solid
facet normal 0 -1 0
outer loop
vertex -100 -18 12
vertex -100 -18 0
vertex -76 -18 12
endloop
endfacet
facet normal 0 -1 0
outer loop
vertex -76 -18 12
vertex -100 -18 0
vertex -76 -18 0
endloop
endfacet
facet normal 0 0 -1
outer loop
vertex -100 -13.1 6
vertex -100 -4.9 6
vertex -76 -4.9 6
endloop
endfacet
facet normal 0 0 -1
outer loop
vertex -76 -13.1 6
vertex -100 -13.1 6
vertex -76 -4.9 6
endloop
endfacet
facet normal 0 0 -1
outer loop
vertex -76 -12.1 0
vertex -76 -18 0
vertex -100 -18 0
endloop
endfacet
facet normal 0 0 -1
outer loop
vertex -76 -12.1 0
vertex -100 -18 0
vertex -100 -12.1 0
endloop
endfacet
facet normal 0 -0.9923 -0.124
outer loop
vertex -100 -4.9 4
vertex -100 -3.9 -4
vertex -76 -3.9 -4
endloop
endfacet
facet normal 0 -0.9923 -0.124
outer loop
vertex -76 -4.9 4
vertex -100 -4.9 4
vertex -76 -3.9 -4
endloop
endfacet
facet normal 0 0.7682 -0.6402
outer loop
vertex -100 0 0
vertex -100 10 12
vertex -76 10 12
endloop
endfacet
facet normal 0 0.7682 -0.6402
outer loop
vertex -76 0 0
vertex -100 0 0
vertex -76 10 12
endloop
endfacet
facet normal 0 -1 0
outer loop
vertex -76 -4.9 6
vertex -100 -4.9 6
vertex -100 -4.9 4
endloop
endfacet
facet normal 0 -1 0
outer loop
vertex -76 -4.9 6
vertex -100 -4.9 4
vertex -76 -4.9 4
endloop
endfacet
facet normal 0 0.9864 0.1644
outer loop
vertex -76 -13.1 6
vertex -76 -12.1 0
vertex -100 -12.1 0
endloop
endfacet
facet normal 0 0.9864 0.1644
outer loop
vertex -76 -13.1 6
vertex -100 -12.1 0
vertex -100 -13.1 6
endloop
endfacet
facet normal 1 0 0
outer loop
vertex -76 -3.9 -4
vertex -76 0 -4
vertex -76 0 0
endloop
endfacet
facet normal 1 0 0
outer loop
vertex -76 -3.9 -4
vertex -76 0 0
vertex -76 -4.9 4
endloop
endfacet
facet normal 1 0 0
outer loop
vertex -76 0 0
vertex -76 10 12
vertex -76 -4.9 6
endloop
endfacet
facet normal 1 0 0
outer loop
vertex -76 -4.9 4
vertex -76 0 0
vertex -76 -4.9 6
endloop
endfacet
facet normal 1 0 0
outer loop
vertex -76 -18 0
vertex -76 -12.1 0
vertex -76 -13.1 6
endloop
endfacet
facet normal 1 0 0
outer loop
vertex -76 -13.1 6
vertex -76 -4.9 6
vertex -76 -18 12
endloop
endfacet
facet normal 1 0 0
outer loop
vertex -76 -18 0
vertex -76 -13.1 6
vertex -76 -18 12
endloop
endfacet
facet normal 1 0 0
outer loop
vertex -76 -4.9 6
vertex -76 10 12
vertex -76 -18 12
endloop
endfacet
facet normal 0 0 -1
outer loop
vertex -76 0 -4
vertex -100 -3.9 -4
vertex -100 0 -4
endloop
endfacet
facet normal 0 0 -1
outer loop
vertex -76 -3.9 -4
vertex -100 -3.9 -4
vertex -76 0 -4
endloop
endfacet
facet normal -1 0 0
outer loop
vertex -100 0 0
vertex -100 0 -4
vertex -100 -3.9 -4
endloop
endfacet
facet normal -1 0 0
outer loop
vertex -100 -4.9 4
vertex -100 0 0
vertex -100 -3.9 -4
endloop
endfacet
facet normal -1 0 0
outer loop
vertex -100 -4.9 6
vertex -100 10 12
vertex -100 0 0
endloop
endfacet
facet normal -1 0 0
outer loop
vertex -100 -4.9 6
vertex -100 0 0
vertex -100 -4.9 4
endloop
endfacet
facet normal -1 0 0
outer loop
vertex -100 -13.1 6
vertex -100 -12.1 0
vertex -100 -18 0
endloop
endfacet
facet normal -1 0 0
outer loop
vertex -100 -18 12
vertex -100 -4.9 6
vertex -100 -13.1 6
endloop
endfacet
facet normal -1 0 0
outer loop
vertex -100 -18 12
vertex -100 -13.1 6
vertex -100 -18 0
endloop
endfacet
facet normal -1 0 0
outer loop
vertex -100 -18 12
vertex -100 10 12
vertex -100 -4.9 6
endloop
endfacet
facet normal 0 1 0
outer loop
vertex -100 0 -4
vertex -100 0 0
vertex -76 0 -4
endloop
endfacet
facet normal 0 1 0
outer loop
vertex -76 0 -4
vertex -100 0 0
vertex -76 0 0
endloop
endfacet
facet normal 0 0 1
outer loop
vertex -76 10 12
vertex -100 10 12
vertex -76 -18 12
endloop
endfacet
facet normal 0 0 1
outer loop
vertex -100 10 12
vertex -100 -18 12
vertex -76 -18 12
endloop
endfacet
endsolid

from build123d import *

# Parameters (mm, degrees)
F0_W     = 24
F0_H     = 4.9
F0_H_2   = 4.1
F1_DEPTH = 12
F2_DEPTH = 6
F3_DEPTH = 10
F4_SIZE2 = 11.99999
F4_SIZE  = 9.99999
F6_DEPTH = 24
F7_DEPTH = 4
F8_SIZE2 = 1
F8_SIZE  = 8


# Not quite as in the source:
# - a fillet or chamfer is up to 0.001 mm smaller than in the source, because OpenCascade refuses the exact size


with BuildPart() as f1:
    # F0 (on Top) → F1 (new body)
    with BuildSketch(Plane.XY):
        with Locations((-88, -2.45)):
            Rectangle(F0_W, F0_H)
        with Locations((-88, -6.95)):
            Rectangle(F0_W, F0_H_2)
        with Locations((-88, -11.05)):
            Rectangle(F0_W, F0_H_2)
        with Locations((-88, -15.55)):
            Rectangle(F0_W, F0_H)
    extrude(amount=F1_DEPTH)

    # F0 (on Top) → F2 (cut)
    with BuildSketch(Plane.XY):
        with Locations((-88, -6.95)):
            Rectangle(F0_W, F0_H_2)
        with Locations((-88, -11.05)):
            Rectangle(F0_W, F0_H_2)
    extrude(amount=F2_DEPTH, mode=Mode.SUBTRACT)

    # F3 (add): a face of the model
    f3_faces = [f1.faces().sort_by_distance(p)[0] for p in [
        (-88, 0, 6),
    ]]
    extrude(f3_faces, amount=F3_DEPTH)

    # F4 (size 10 and 12 in the source; OpenCascade refuses exactly that, so slightly less here)
    f4_edges = [f1.edges().sort_by_distance(p)[0] for p in [
        (-88, 10, 0),
    ]]
    f4_side = f1.faces().sort_by_distance((-88, 2.55, 0))[0]
    chamfer(f4_edges, length=F4_SIZE, length2=F4_SIZE2, reference=f4_side)

    # F5 (on face) → F6 (join, through all)
    with BuildSketch(Plane.YZ.offset(-76)):
        Polygon((-13.1, 0), (-12.1, 0), (-13.1, 6), align=None)
    extrude(amount=-F6_DEPTH)

    # F7 (add): a face of the model
    f7_faces = [f1.faces().sort_by_distance(p)[0] for p in [
        (-88, -2.449995, 0),
    ]]
    extrude(f7_faces, amount=F7_DEPTH)

    # F8
    f8_edges = [f1.edges().sort_by_distance(p)[0] for p in [
        (-88, -4.9, -4),
    ]]
    f8_side = f1.faces().sort_by_distance((-88, -4.9, 1))[0]
    chamfer(f8_edges, length=F8_SIZE, length2=F8_SIZE2, reference=f8_side)


solid = f1.part
